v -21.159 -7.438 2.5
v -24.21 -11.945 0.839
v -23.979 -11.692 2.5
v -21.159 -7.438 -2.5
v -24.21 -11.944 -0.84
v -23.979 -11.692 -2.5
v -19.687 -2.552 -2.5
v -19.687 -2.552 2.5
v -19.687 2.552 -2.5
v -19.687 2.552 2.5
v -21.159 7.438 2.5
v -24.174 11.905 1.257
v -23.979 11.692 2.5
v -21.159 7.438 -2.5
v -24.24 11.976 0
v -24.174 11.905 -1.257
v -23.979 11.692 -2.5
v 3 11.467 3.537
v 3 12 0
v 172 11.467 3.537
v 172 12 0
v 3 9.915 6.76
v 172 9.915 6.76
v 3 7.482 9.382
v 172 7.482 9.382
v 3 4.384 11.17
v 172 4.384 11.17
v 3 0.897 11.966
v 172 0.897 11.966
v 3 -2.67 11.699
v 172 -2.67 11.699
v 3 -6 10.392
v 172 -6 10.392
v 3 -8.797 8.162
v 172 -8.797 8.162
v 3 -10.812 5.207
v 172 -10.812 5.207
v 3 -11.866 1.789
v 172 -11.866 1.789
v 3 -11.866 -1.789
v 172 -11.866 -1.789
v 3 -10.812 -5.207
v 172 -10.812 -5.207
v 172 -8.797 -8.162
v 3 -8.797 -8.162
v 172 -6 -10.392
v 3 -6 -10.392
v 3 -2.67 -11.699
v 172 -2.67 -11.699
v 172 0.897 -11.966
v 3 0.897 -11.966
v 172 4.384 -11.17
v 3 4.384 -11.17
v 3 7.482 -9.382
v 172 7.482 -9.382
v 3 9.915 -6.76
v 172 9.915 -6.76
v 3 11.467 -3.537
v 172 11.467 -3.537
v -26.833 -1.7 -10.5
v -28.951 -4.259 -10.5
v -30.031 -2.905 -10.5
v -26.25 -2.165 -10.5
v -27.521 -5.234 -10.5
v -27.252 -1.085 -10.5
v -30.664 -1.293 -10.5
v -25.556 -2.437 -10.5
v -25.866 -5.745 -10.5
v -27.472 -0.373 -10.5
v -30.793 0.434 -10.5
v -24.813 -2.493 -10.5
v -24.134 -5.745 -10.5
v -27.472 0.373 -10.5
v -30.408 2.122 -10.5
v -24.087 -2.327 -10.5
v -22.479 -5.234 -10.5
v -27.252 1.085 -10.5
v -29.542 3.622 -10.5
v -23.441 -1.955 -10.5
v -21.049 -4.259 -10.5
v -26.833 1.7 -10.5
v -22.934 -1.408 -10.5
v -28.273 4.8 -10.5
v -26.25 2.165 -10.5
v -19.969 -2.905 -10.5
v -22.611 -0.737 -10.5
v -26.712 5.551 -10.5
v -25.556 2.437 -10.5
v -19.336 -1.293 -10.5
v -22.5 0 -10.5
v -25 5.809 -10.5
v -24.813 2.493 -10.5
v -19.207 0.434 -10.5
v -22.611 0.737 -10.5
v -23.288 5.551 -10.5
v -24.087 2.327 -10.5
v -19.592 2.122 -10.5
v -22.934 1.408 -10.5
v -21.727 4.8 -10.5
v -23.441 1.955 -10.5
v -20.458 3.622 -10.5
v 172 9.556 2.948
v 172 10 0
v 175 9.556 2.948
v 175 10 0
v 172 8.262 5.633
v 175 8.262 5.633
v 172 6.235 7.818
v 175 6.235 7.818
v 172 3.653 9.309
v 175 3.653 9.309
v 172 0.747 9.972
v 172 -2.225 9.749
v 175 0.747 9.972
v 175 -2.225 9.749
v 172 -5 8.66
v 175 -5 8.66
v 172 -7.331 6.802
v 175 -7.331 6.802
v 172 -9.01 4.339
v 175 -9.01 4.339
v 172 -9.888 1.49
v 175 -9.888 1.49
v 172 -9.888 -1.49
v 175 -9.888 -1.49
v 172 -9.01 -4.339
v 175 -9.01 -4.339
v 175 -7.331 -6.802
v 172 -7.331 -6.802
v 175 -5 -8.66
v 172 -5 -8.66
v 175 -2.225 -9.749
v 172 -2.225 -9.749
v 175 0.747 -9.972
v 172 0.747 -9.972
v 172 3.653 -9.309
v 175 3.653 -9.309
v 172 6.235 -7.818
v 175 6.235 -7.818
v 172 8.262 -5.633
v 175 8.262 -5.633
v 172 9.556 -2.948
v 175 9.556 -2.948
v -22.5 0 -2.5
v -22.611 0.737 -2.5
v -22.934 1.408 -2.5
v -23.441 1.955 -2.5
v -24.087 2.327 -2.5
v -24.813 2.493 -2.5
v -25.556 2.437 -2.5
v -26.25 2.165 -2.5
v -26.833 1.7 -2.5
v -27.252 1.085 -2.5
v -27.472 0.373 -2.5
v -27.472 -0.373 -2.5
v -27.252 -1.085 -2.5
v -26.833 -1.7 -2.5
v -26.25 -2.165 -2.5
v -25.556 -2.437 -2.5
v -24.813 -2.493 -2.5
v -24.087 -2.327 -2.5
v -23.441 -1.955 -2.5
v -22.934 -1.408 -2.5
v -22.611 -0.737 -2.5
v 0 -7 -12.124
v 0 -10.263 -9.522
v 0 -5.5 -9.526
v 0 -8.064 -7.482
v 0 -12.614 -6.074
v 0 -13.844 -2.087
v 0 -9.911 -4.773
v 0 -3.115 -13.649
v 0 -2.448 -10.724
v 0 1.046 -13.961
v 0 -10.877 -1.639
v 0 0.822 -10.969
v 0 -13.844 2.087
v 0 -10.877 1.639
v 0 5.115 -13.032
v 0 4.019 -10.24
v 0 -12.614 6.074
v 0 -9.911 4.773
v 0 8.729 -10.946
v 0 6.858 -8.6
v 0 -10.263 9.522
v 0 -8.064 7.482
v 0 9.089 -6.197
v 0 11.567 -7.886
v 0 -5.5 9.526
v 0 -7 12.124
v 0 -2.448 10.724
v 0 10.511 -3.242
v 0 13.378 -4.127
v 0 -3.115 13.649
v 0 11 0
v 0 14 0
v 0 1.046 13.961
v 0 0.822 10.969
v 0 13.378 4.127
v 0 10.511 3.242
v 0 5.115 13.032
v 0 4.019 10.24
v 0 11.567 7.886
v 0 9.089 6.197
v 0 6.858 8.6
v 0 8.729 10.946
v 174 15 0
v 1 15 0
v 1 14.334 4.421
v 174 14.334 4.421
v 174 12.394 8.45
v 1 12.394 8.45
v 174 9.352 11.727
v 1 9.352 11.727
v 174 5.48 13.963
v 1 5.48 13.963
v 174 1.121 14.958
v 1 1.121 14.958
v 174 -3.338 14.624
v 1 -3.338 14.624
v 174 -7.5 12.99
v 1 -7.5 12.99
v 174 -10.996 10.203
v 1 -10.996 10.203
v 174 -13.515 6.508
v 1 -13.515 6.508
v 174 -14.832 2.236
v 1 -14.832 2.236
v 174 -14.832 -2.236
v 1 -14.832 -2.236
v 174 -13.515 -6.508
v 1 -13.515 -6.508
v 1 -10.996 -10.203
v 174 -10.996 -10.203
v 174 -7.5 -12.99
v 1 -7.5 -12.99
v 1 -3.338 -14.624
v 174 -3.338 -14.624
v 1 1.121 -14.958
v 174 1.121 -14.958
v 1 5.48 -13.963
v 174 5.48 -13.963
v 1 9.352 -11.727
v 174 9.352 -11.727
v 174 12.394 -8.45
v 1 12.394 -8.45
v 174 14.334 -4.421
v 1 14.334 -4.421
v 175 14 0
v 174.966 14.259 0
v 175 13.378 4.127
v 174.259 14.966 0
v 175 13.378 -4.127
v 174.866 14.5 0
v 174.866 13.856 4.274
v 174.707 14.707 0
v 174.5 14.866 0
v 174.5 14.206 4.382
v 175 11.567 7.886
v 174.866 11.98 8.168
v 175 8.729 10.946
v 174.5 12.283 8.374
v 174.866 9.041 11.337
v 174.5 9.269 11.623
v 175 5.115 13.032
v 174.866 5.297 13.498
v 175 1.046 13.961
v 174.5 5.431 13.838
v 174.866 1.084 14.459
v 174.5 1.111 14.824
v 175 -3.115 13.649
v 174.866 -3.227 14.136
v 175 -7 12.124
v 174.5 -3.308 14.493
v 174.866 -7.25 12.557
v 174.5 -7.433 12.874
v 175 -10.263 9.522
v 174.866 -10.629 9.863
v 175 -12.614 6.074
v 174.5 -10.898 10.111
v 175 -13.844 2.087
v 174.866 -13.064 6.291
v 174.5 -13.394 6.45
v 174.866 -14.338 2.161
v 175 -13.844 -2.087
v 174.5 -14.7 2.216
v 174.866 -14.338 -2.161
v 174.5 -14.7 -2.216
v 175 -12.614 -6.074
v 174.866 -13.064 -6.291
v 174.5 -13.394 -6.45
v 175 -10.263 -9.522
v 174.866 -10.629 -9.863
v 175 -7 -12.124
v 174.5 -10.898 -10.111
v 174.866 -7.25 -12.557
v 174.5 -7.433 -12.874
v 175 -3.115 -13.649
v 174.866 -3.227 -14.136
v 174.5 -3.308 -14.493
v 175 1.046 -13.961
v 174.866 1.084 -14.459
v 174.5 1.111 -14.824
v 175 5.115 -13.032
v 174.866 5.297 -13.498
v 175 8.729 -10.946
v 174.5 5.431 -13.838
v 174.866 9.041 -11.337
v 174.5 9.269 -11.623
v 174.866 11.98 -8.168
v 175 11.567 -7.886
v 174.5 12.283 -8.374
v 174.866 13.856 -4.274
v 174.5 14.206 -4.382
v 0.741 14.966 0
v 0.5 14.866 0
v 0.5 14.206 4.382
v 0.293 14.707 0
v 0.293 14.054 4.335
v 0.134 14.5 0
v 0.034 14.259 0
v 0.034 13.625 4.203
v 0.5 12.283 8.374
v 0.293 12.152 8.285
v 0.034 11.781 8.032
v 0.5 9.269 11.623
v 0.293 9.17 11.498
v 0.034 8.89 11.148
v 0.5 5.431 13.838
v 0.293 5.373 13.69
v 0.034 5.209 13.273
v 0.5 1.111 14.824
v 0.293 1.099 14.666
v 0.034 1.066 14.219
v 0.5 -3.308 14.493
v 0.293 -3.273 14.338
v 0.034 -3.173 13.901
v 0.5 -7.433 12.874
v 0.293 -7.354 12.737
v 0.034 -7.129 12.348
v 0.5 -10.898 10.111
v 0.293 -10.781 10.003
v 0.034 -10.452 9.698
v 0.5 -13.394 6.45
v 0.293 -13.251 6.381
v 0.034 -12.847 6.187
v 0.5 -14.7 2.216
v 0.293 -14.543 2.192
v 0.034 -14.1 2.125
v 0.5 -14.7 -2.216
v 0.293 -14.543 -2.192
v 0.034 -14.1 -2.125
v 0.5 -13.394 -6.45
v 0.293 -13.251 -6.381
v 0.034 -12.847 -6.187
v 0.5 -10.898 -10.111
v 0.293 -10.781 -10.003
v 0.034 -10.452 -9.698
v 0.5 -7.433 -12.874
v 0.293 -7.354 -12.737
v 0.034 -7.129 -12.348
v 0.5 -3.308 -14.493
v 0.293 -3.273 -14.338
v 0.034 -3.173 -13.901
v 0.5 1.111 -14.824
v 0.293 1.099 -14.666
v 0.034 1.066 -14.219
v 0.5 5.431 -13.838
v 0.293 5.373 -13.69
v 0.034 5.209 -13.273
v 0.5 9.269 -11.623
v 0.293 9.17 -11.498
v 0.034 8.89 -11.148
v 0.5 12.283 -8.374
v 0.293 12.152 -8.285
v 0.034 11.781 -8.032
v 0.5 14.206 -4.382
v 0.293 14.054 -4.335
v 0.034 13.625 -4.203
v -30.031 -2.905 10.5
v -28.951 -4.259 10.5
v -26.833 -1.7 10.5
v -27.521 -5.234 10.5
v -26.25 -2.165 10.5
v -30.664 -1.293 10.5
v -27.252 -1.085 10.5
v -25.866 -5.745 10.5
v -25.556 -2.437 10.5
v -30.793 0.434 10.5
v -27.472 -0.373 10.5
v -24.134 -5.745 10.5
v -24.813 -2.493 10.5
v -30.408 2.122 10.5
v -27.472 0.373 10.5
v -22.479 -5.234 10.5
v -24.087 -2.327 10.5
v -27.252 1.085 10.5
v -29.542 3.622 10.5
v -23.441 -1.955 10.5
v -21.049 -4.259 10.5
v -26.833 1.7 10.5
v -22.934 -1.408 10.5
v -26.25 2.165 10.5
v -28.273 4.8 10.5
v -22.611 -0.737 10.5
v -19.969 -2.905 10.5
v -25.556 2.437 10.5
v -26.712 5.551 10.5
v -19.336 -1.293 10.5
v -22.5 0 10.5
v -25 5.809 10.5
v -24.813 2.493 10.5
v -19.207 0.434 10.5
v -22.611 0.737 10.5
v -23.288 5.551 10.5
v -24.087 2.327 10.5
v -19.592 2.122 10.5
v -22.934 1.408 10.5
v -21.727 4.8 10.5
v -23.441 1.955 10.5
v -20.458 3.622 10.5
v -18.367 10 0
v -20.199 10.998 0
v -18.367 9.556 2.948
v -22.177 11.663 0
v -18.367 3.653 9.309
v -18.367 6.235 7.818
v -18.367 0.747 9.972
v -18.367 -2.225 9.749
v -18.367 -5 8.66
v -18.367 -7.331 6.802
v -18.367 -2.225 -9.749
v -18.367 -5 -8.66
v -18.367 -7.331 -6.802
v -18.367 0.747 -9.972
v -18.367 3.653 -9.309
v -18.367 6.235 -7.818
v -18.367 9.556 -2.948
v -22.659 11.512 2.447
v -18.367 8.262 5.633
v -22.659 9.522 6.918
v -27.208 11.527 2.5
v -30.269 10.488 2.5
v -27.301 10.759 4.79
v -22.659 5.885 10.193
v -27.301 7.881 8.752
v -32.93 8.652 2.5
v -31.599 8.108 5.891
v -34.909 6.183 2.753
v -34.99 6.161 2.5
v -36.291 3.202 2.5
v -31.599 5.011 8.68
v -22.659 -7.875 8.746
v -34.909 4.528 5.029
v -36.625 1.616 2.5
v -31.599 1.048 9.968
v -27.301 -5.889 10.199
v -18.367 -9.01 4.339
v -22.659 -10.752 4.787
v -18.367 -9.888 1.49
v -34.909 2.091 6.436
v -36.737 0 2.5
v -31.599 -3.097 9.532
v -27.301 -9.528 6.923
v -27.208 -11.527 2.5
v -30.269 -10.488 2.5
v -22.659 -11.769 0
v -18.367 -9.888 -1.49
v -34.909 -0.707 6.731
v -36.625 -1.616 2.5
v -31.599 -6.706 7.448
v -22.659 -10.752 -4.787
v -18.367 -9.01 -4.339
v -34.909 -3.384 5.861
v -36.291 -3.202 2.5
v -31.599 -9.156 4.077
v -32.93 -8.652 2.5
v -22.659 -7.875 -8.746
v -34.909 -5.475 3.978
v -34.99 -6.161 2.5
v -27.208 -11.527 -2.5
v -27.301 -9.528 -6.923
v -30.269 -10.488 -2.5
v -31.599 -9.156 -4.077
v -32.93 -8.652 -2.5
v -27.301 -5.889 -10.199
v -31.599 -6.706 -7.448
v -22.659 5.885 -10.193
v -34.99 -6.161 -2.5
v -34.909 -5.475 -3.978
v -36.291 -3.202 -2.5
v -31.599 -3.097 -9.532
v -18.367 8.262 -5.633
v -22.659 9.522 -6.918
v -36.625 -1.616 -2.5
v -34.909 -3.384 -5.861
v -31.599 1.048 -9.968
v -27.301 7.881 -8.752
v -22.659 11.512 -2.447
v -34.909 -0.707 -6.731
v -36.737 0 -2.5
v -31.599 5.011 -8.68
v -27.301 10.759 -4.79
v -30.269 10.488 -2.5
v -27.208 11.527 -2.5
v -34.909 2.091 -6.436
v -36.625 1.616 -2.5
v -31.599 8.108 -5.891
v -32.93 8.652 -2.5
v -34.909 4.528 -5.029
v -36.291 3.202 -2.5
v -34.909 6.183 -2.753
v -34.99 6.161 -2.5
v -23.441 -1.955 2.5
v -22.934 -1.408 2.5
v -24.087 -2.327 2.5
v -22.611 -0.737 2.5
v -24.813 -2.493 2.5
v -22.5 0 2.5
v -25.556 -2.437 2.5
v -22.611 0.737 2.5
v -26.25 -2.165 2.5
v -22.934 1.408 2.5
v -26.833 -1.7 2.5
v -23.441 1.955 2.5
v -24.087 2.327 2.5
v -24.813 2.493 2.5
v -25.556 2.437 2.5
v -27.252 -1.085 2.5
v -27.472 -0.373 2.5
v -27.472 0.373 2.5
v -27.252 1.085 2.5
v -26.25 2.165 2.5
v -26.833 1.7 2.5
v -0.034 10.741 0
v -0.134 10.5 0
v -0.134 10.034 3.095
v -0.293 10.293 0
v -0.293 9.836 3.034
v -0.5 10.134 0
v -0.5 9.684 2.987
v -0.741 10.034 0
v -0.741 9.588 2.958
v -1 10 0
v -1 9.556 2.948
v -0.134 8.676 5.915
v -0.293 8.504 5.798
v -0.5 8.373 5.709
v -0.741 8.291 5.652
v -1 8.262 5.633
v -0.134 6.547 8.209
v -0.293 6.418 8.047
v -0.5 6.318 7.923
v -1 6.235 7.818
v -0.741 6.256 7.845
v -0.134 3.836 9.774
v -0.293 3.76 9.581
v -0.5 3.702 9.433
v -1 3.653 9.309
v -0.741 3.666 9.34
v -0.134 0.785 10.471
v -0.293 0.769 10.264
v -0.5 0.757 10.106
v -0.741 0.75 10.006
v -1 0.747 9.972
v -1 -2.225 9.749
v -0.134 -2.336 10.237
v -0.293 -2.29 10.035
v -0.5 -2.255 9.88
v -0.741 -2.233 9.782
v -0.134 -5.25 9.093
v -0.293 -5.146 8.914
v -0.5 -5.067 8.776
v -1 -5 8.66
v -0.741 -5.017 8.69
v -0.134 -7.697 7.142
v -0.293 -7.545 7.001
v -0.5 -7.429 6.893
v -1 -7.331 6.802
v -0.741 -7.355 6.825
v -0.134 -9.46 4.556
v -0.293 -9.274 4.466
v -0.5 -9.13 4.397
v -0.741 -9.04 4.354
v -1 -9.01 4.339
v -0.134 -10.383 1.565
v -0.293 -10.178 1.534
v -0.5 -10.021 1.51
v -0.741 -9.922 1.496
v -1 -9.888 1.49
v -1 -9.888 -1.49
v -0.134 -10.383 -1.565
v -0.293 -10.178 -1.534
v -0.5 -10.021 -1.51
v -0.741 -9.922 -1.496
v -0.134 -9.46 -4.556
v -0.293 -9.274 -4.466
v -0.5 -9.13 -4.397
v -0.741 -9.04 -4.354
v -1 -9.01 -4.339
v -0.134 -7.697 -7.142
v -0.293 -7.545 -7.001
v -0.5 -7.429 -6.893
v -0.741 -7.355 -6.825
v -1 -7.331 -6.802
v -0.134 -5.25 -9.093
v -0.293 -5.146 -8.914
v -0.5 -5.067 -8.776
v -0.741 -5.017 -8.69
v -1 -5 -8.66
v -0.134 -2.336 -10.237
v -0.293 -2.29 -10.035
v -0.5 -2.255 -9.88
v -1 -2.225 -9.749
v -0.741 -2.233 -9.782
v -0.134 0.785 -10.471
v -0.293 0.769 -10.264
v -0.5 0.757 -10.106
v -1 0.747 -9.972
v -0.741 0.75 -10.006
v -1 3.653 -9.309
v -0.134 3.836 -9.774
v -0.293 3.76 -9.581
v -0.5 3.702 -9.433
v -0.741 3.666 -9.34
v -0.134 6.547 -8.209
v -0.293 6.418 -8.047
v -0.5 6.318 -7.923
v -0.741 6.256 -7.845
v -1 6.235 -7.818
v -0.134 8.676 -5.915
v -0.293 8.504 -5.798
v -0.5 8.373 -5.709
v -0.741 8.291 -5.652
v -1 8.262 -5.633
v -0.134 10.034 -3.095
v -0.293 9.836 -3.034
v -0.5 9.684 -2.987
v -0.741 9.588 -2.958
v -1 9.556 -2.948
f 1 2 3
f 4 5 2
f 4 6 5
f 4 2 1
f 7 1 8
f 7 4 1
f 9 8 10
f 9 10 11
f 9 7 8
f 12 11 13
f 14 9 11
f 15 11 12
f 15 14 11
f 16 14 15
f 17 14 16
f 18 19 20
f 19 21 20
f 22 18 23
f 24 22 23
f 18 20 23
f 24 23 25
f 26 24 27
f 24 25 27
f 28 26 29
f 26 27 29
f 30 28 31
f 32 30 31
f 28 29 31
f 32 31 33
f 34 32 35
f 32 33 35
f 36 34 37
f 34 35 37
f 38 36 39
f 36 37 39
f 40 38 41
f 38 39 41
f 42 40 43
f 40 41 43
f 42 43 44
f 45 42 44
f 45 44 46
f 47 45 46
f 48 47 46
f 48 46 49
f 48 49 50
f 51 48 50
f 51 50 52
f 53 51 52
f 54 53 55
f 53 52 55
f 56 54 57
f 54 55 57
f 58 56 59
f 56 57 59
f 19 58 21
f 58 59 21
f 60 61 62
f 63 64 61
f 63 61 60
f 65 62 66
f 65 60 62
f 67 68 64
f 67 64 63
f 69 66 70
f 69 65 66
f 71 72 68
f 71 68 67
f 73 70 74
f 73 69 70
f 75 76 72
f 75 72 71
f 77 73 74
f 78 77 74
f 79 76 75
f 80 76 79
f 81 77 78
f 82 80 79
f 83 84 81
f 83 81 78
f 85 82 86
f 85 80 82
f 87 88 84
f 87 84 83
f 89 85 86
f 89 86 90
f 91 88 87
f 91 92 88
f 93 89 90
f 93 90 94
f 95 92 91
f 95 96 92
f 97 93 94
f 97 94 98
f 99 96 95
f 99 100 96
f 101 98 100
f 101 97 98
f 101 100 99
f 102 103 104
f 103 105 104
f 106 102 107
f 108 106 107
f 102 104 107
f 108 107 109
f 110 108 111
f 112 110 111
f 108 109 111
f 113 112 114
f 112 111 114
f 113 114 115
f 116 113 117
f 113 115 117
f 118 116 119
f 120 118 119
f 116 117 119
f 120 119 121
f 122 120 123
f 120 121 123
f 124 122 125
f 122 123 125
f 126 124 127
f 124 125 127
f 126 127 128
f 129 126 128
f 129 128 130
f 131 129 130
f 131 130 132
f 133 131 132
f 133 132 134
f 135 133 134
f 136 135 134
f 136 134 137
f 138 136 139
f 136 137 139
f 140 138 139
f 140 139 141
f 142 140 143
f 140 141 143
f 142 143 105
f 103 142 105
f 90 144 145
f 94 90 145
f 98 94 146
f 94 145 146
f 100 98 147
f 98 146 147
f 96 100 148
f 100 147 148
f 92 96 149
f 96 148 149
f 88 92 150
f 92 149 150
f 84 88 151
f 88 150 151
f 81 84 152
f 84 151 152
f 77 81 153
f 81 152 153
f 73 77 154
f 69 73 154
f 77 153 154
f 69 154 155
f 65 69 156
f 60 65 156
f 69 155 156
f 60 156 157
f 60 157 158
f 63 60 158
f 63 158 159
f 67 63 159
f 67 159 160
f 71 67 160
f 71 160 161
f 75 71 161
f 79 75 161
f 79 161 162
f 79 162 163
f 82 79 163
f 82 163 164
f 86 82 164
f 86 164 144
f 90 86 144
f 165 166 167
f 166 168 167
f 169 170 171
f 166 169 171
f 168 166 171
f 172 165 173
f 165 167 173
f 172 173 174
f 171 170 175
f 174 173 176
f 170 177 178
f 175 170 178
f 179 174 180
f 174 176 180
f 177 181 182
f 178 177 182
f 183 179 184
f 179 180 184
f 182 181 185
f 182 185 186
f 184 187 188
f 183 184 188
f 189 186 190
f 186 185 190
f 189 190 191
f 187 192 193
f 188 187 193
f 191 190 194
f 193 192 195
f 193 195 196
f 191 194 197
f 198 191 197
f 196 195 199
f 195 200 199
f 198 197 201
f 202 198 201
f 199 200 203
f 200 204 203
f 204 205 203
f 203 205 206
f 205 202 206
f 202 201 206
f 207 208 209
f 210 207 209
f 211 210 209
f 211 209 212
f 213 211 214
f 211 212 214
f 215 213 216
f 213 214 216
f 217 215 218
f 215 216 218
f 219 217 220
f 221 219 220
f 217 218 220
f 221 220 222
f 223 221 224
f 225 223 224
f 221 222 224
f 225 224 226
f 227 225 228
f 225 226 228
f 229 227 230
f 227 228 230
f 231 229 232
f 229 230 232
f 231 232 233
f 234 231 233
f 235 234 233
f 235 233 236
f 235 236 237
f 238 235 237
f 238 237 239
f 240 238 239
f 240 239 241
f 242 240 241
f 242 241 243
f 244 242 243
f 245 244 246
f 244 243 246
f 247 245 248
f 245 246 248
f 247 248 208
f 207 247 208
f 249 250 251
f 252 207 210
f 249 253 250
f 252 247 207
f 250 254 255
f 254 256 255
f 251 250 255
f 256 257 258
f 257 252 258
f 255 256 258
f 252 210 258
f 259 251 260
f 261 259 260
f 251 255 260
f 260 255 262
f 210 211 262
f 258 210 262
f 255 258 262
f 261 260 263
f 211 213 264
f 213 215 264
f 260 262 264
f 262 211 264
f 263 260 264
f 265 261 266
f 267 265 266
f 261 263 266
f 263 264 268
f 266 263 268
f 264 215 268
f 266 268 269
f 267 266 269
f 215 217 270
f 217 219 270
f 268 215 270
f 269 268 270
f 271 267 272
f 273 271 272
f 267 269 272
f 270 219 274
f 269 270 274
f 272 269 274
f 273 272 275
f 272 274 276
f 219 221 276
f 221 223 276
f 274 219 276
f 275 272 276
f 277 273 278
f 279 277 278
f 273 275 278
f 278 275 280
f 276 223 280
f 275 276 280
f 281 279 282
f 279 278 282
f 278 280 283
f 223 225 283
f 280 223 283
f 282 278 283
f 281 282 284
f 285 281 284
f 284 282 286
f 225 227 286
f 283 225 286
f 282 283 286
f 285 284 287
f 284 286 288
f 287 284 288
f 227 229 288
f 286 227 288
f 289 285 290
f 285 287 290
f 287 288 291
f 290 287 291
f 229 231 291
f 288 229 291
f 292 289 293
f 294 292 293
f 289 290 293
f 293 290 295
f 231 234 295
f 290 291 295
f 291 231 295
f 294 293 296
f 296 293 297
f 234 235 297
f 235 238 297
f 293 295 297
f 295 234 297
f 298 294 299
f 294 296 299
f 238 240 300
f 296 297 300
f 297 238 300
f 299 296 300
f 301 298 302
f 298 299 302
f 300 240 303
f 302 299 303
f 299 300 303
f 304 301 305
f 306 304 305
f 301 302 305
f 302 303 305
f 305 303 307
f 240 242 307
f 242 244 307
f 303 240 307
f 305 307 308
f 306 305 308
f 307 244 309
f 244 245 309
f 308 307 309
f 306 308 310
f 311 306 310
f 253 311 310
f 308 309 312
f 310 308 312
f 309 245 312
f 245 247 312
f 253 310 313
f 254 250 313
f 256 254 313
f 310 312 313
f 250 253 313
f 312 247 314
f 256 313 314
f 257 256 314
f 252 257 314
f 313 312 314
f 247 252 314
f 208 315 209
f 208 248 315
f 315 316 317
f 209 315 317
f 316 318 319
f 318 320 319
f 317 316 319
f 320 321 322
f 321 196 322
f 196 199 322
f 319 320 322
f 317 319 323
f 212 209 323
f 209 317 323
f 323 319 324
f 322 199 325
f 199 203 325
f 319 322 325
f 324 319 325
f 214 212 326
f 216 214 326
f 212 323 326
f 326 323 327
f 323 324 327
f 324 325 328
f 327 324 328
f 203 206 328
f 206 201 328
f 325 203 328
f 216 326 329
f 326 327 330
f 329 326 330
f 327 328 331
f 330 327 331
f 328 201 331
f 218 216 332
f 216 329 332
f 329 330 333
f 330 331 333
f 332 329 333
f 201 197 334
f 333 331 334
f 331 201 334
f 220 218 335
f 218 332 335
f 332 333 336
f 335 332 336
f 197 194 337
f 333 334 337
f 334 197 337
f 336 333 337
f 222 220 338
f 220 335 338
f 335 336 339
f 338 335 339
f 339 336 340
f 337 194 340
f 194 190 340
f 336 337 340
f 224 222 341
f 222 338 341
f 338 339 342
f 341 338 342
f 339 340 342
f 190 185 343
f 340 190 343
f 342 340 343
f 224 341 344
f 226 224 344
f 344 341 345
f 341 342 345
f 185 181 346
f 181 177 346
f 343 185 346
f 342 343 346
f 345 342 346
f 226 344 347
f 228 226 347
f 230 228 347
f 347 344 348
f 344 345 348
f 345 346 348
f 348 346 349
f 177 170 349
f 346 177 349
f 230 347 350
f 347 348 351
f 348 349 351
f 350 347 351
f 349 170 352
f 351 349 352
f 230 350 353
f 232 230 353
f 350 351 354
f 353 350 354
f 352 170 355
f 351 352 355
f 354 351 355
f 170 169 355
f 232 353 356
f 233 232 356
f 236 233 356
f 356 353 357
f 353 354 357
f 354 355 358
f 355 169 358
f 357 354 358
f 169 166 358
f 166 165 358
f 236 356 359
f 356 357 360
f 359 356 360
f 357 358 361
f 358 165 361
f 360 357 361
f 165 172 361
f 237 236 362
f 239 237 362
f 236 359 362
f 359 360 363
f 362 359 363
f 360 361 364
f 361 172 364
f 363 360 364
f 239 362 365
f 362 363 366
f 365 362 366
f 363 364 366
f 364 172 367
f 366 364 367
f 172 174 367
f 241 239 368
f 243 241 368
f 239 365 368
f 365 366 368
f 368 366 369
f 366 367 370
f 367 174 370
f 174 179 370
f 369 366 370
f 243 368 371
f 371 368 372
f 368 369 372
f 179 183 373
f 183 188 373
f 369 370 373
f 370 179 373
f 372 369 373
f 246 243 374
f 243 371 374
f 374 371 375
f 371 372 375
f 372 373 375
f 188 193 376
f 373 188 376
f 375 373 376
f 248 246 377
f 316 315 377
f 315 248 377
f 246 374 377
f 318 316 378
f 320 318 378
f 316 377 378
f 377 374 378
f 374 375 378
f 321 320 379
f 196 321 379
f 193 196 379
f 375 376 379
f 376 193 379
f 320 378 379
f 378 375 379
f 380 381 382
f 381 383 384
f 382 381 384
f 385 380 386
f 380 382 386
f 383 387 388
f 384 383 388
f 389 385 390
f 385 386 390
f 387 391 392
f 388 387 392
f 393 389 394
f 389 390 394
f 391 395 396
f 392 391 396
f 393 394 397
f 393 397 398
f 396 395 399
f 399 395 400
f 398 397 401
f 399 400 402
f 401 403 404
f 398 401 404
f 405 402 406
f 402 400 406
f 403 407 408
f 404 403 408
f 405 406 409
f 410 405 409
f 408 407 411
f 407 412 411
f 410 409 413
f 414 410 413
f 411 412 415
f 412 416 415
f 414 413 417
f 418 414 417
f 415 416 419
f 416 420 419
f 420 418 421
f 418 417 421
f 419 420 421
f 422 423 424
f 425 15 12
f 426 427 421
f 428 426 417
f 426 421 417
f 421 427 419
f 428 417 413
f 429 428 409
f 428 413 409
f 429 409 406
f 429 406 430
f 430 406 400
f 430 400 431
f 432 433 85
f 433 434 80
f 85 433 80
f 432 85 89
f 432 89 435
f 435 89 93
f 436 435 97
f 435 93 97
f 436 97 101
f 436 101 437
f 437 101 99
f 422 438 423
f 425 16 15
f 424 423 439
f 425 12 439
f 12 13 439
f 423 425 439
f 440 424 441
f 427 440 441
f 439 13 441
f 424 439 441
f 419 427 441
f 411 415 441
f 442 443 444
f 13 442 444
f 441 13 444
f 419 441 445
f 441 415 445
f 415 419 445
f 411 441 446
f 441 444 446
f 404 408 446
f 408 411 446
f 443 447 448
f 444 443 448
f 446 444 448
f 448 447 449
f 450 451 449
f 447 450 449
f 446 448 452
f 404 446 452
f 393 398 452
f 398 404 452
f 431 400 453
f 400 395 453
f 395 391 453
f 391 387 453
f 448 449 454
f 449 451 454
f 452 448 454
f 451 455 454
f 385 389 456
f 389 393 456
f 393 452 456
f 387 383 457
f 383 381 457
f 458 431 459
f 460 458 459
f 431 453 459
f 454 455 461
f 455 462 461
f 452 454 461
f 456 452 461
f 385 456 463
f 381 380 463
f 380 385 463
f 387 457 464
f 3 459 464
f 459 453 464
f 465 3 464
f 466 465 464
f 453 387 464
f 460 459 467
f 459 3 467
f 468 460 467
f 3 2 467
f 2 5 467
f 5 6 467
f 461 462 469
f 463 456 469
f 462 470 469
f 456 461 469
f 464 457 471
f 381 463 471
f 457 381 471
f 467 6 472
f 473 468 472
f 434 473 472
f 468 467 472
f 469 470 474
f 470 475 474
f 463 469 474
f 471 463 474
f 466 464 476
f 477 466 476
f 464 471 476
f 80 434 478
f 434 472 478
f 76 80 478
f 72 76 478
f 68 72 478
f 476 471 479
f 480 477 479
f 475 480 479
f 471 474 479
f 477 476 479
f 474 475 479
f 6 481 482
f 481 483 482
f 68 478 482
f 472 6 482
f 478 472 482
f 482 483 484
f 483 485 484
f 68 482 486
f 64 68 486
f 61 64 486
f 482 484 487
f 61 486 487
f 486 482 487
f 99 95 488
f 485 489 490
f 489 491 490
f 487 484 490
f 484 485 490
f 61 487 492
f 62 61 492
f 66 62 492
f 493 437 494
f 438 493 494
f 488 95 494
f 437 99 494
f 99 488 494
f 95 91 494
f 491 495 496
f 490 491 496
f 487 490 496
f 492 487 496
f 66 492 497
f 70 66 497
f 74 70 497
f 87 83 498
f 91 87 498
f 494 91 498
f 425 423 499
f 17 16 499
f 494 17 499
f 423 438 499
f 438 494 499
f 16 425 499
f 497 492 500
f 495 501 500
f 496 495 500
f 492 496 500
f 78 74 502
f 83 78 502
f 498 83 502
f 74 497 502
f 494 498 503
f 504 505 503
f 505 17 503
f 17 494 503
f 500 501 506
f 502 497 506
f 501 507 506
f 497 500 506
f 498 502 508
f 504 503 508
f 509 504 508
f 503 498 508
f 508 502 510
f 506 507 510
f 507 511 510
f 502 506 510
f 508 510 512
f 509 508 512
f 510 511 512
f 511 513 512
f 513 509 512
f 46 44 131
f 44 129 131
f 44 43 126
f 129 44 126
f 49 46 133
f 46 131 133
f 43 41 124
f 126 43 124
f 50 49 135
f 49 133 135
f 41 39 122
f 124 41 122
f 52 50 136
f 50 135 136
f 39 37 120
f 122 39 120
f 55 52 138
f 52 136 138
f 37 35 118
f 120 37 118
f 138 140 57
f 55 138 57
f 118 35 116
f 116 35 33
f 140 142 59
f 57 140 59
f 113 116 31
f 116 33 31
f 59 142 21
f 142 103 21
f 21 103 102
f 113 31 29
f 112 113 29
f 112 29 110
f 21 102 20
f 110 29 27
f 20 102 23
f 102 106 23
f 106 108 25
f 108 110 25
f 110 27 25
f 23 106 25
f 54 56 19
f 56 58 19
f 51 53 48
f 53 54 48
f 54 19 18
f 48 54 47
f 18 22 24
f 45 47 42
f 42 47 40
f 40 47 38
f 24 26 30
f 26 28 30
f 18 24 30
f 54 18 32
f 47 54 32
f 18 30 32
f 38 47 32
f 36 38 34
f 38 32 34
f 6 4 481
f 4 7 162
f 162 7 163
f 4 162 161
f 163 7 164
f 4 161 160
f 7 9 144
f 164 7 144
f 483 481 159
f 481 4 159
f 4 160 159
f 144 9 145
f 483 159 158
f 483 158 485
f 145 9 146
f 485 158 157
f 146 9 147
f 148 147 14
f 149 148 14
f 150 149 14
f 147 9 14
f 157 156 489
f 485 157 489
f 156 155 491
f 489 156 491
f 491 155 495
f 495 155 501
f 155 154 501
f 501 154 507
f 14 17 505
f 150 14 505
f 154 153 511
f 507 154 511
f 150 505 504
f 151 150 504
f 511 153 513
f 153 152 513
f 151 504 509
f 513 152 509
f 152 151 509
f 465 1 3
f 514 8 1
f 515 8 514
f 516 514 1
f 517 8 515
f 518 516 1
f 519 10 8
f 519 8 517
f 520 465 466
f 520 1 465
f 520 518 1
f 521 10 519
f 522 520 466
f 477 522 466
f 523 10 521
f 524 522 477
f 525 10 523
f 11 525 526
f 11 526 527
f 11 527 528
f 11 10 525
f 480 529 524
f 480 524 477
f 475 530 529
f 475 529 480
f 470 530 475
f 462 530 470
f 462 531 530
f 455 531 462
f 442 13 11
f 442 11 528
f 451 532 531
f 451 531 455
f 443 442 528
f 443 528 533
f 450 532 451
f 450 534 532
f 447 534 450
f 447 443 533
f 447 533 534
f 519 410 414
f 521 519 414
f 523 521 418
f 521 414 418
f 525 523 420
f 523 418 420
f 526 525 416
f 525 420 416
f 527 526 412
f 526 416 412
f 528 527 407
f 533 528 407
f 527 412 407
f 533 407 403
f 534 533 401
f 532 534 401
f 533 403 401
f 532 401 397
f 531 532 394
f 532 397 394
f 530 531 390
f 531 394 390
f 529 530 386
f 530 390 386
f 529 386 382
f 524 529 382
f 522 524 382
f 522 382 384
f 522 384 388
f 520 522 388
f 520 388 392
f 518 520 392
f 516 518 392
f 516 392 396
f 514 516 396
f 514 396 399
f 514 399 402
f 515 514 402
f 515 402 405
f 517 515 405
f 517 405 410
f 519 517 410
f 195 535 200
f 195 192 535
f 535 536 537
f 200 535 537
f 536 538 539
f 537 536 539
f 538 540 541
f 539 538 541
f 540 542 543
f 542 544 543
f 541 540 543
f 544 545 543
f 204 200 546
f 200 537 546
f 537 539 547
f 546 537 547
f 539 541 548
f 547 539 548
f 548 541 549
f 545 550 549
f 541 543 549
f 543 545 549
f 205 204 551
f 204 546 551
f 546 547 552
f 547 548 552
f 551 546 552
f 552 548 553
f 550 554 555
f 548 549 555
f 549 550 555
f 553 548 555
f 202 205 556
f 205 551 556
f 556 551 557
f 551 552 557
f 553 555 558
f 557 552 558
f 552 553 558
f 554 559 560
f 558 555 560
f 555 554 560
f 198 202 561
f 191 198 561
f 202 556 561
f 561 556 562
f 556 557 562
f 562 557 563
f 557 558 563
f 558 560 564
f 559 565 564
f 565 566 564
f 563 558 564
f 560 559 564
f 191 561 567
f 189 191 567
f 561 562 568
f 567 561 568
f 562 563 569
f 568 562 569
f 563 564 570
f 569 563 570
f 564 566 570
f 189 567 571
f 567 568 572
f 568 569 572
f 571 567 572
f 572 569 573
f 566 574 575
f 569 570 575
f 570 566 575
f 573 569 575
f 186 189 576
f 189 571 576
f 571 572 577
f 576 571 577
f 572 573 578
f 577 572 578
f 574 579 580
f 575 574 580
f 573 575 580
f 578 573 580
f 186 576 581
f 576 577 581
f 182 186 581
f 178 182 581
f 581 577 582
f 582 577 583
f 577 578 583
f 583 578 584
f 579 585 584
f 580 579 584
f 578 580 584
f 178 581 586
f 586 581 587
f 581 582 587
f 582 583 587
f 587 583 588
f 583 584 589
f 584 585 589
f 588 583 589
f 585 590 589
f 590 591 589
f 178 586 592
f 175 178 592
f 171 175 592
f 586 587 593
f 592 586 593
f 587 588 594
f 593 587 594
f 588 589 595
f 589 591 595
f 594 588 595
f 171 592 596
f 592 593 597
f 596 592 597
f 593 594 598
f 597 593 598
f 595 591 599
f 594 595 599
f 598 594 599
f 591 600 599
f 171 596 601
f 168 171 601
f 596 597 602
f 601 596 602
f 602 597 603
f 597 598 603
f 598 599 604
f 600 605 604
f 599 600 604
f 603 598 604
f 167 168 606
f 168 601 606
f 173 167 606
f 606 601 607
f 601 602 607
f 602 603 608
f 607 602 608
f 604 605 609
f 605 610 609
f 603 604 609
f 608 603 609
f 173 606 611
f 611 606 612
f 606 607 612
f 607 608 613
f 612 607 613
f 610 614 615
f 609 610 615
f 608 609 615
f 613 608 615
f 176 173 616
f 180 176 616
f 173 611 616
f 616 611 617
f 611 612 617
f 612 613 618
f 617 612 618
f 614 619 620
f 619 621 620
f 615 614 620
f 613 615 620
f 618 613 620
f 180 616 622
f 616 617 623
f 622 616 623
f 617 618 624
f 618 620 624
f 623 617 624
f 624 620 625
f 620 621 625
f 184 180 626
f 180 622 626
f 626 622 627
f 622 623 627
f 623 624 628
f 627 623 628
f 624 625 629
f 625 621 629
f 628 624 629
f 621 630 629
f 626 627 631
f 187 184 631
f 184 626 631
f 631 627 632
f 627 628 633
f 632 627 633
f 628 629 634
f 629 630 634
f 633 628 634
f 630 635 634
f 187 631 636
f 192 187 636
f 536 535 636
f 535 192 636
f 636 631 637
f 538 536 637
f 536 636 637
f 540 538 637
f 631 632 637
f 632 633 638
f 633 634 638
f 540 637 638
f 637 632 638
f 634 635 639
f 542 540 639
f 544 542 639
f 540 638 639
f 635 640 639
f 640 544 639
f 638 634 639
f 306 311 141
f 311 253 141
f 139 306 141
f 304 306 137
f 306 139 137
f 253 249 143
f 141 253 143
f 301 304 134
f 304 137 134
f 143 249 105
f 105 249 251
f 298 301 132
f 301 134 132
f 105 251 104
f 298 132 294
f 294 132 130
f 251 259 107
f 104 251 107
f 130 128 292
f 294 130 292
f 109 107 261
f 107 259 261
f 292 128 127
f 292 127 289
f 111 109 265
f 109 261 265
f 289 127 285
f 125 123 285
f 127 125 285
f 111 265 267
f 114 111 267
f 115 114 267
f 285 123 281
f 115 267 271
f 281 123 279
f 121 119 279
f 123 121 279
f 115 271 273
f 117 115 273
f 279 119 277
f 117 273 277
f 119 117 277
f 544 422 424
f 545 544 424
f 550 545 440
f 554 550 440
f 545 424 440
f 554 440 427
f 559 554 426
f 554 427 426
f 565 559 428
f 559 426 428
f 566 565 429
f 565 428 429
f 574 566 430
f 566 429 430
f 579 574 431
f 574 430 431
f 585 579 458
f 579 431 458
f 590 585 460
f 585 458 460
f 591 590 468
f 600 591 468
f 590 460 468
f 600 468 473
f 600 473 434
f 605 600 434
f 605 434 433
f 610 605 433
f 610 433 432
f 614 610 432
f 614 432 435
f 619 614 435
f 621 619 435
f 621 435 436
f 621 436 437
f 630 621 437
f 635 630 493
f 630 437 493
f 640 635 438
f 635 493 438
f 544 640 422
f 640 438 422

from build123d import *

# Parameters (mm, degrees)
SKETCH6_OUTSIDE_W       = 75.24
SKETCH6_OUTSIDE_H       = 75.24
SKETCH6_OUTSIDE_W_2     = 21
SKETCH6_OUTSIDE_H_2     = 30
CUT_EXTRUDE3_DEPTH      = 40
SKETCH4_W               = 17.5
SKETCH4_H               = 5
FILLET1_R               = 1
SKETCH8_R               = 2.5
CUT_EXTRUDE4_DEPTH      = 5.5
CUT_EXTRUDE4_DEPTH_BACK = 26.5


with BuildPart() as part:
    # Sketch1 → Revolve1 (revolve)
    with BuildSketch(Plane.XY):
        with BuildLine():
            Line((172, 10), (175, 10))
            Line((175, 10), (175, 15))
            Line((175, 15), (0, 15))
            Line((0, 15), (0, 10))
            Line((0, 10), (-18.366750419, 10))
            ThreePointArc((-18.366750419, 10), (-30.674548662, 10.573528147), (-37, 0))
            Line((-37, 0), (0, 0))
            Line((0, 0), (3, 0))
            Line((3, 0), (3, 12))
            Line((3, 12), (172, 12))
            Line((172, 12), (172, 10))
        make_face()
    revolve(axis=Axis((0, 0, 0), (1, 0, 0)))

    # Sketch6 outside → Cut-Extrude3 (cut)
    with BuildSketch(Plane.ZY):
        Rectangle(SKETCH6_OUTSIDE_W, SKETCH6_OUTSIDE_H)
        Rectangle(SKETCH6_OUTSIDE_W_2, SKETCH6_OUTSIDE_H_2, mode=Mode.SUBTRACT)
    extrude(amount=CUT_EXTRUDE3_DEPTH, mode=Mode.SUBTRACT)

    # Sketch4 → Cut-Revolve1 (revolve, cut)
    with BuildSketch(Plane(origin=(0, 0, 0), x_dir=(1, 0, 0), z_dir=(0, 1, 0))):
        with Locations((-28.25, 0)):
            Rectangle(SKETCH4_W, SKETCH4_H)
    revolve(axis=Axis((-37, 0, -2.5), (0, 0, 1)), mode=Mode.SUBTRACT)

    # Fillet1
    fillet1_edges = [part.edges().sort_by_distance(p)[0] for p in [
        (175, -15, 0),
        (0, -15, 0),
        (0, -10, 0),
        (0, -15, 0),
    ]]
    fillet(fillet1_edges, radius=FILLET1_R)

    # Sketch8 → Cut-Extrude4 (cut, two sides)
    with BuildSketch(Plane.XY.offset(10.5)) as cut_extrude4_sk:
        with Locations((-25, 0)):
            Circle(SKETCH8_R)
    extrude(amount=CUT_EXTRUDE4_DEPTH, mode=Mode.SUBTRACT)
    extrude(cut_extrude4_sk.sketch, amount=-CUT_EXTRUDE4_DEPTH_BACK, mode=Mode.SUBTRACT)


solid = part.part
